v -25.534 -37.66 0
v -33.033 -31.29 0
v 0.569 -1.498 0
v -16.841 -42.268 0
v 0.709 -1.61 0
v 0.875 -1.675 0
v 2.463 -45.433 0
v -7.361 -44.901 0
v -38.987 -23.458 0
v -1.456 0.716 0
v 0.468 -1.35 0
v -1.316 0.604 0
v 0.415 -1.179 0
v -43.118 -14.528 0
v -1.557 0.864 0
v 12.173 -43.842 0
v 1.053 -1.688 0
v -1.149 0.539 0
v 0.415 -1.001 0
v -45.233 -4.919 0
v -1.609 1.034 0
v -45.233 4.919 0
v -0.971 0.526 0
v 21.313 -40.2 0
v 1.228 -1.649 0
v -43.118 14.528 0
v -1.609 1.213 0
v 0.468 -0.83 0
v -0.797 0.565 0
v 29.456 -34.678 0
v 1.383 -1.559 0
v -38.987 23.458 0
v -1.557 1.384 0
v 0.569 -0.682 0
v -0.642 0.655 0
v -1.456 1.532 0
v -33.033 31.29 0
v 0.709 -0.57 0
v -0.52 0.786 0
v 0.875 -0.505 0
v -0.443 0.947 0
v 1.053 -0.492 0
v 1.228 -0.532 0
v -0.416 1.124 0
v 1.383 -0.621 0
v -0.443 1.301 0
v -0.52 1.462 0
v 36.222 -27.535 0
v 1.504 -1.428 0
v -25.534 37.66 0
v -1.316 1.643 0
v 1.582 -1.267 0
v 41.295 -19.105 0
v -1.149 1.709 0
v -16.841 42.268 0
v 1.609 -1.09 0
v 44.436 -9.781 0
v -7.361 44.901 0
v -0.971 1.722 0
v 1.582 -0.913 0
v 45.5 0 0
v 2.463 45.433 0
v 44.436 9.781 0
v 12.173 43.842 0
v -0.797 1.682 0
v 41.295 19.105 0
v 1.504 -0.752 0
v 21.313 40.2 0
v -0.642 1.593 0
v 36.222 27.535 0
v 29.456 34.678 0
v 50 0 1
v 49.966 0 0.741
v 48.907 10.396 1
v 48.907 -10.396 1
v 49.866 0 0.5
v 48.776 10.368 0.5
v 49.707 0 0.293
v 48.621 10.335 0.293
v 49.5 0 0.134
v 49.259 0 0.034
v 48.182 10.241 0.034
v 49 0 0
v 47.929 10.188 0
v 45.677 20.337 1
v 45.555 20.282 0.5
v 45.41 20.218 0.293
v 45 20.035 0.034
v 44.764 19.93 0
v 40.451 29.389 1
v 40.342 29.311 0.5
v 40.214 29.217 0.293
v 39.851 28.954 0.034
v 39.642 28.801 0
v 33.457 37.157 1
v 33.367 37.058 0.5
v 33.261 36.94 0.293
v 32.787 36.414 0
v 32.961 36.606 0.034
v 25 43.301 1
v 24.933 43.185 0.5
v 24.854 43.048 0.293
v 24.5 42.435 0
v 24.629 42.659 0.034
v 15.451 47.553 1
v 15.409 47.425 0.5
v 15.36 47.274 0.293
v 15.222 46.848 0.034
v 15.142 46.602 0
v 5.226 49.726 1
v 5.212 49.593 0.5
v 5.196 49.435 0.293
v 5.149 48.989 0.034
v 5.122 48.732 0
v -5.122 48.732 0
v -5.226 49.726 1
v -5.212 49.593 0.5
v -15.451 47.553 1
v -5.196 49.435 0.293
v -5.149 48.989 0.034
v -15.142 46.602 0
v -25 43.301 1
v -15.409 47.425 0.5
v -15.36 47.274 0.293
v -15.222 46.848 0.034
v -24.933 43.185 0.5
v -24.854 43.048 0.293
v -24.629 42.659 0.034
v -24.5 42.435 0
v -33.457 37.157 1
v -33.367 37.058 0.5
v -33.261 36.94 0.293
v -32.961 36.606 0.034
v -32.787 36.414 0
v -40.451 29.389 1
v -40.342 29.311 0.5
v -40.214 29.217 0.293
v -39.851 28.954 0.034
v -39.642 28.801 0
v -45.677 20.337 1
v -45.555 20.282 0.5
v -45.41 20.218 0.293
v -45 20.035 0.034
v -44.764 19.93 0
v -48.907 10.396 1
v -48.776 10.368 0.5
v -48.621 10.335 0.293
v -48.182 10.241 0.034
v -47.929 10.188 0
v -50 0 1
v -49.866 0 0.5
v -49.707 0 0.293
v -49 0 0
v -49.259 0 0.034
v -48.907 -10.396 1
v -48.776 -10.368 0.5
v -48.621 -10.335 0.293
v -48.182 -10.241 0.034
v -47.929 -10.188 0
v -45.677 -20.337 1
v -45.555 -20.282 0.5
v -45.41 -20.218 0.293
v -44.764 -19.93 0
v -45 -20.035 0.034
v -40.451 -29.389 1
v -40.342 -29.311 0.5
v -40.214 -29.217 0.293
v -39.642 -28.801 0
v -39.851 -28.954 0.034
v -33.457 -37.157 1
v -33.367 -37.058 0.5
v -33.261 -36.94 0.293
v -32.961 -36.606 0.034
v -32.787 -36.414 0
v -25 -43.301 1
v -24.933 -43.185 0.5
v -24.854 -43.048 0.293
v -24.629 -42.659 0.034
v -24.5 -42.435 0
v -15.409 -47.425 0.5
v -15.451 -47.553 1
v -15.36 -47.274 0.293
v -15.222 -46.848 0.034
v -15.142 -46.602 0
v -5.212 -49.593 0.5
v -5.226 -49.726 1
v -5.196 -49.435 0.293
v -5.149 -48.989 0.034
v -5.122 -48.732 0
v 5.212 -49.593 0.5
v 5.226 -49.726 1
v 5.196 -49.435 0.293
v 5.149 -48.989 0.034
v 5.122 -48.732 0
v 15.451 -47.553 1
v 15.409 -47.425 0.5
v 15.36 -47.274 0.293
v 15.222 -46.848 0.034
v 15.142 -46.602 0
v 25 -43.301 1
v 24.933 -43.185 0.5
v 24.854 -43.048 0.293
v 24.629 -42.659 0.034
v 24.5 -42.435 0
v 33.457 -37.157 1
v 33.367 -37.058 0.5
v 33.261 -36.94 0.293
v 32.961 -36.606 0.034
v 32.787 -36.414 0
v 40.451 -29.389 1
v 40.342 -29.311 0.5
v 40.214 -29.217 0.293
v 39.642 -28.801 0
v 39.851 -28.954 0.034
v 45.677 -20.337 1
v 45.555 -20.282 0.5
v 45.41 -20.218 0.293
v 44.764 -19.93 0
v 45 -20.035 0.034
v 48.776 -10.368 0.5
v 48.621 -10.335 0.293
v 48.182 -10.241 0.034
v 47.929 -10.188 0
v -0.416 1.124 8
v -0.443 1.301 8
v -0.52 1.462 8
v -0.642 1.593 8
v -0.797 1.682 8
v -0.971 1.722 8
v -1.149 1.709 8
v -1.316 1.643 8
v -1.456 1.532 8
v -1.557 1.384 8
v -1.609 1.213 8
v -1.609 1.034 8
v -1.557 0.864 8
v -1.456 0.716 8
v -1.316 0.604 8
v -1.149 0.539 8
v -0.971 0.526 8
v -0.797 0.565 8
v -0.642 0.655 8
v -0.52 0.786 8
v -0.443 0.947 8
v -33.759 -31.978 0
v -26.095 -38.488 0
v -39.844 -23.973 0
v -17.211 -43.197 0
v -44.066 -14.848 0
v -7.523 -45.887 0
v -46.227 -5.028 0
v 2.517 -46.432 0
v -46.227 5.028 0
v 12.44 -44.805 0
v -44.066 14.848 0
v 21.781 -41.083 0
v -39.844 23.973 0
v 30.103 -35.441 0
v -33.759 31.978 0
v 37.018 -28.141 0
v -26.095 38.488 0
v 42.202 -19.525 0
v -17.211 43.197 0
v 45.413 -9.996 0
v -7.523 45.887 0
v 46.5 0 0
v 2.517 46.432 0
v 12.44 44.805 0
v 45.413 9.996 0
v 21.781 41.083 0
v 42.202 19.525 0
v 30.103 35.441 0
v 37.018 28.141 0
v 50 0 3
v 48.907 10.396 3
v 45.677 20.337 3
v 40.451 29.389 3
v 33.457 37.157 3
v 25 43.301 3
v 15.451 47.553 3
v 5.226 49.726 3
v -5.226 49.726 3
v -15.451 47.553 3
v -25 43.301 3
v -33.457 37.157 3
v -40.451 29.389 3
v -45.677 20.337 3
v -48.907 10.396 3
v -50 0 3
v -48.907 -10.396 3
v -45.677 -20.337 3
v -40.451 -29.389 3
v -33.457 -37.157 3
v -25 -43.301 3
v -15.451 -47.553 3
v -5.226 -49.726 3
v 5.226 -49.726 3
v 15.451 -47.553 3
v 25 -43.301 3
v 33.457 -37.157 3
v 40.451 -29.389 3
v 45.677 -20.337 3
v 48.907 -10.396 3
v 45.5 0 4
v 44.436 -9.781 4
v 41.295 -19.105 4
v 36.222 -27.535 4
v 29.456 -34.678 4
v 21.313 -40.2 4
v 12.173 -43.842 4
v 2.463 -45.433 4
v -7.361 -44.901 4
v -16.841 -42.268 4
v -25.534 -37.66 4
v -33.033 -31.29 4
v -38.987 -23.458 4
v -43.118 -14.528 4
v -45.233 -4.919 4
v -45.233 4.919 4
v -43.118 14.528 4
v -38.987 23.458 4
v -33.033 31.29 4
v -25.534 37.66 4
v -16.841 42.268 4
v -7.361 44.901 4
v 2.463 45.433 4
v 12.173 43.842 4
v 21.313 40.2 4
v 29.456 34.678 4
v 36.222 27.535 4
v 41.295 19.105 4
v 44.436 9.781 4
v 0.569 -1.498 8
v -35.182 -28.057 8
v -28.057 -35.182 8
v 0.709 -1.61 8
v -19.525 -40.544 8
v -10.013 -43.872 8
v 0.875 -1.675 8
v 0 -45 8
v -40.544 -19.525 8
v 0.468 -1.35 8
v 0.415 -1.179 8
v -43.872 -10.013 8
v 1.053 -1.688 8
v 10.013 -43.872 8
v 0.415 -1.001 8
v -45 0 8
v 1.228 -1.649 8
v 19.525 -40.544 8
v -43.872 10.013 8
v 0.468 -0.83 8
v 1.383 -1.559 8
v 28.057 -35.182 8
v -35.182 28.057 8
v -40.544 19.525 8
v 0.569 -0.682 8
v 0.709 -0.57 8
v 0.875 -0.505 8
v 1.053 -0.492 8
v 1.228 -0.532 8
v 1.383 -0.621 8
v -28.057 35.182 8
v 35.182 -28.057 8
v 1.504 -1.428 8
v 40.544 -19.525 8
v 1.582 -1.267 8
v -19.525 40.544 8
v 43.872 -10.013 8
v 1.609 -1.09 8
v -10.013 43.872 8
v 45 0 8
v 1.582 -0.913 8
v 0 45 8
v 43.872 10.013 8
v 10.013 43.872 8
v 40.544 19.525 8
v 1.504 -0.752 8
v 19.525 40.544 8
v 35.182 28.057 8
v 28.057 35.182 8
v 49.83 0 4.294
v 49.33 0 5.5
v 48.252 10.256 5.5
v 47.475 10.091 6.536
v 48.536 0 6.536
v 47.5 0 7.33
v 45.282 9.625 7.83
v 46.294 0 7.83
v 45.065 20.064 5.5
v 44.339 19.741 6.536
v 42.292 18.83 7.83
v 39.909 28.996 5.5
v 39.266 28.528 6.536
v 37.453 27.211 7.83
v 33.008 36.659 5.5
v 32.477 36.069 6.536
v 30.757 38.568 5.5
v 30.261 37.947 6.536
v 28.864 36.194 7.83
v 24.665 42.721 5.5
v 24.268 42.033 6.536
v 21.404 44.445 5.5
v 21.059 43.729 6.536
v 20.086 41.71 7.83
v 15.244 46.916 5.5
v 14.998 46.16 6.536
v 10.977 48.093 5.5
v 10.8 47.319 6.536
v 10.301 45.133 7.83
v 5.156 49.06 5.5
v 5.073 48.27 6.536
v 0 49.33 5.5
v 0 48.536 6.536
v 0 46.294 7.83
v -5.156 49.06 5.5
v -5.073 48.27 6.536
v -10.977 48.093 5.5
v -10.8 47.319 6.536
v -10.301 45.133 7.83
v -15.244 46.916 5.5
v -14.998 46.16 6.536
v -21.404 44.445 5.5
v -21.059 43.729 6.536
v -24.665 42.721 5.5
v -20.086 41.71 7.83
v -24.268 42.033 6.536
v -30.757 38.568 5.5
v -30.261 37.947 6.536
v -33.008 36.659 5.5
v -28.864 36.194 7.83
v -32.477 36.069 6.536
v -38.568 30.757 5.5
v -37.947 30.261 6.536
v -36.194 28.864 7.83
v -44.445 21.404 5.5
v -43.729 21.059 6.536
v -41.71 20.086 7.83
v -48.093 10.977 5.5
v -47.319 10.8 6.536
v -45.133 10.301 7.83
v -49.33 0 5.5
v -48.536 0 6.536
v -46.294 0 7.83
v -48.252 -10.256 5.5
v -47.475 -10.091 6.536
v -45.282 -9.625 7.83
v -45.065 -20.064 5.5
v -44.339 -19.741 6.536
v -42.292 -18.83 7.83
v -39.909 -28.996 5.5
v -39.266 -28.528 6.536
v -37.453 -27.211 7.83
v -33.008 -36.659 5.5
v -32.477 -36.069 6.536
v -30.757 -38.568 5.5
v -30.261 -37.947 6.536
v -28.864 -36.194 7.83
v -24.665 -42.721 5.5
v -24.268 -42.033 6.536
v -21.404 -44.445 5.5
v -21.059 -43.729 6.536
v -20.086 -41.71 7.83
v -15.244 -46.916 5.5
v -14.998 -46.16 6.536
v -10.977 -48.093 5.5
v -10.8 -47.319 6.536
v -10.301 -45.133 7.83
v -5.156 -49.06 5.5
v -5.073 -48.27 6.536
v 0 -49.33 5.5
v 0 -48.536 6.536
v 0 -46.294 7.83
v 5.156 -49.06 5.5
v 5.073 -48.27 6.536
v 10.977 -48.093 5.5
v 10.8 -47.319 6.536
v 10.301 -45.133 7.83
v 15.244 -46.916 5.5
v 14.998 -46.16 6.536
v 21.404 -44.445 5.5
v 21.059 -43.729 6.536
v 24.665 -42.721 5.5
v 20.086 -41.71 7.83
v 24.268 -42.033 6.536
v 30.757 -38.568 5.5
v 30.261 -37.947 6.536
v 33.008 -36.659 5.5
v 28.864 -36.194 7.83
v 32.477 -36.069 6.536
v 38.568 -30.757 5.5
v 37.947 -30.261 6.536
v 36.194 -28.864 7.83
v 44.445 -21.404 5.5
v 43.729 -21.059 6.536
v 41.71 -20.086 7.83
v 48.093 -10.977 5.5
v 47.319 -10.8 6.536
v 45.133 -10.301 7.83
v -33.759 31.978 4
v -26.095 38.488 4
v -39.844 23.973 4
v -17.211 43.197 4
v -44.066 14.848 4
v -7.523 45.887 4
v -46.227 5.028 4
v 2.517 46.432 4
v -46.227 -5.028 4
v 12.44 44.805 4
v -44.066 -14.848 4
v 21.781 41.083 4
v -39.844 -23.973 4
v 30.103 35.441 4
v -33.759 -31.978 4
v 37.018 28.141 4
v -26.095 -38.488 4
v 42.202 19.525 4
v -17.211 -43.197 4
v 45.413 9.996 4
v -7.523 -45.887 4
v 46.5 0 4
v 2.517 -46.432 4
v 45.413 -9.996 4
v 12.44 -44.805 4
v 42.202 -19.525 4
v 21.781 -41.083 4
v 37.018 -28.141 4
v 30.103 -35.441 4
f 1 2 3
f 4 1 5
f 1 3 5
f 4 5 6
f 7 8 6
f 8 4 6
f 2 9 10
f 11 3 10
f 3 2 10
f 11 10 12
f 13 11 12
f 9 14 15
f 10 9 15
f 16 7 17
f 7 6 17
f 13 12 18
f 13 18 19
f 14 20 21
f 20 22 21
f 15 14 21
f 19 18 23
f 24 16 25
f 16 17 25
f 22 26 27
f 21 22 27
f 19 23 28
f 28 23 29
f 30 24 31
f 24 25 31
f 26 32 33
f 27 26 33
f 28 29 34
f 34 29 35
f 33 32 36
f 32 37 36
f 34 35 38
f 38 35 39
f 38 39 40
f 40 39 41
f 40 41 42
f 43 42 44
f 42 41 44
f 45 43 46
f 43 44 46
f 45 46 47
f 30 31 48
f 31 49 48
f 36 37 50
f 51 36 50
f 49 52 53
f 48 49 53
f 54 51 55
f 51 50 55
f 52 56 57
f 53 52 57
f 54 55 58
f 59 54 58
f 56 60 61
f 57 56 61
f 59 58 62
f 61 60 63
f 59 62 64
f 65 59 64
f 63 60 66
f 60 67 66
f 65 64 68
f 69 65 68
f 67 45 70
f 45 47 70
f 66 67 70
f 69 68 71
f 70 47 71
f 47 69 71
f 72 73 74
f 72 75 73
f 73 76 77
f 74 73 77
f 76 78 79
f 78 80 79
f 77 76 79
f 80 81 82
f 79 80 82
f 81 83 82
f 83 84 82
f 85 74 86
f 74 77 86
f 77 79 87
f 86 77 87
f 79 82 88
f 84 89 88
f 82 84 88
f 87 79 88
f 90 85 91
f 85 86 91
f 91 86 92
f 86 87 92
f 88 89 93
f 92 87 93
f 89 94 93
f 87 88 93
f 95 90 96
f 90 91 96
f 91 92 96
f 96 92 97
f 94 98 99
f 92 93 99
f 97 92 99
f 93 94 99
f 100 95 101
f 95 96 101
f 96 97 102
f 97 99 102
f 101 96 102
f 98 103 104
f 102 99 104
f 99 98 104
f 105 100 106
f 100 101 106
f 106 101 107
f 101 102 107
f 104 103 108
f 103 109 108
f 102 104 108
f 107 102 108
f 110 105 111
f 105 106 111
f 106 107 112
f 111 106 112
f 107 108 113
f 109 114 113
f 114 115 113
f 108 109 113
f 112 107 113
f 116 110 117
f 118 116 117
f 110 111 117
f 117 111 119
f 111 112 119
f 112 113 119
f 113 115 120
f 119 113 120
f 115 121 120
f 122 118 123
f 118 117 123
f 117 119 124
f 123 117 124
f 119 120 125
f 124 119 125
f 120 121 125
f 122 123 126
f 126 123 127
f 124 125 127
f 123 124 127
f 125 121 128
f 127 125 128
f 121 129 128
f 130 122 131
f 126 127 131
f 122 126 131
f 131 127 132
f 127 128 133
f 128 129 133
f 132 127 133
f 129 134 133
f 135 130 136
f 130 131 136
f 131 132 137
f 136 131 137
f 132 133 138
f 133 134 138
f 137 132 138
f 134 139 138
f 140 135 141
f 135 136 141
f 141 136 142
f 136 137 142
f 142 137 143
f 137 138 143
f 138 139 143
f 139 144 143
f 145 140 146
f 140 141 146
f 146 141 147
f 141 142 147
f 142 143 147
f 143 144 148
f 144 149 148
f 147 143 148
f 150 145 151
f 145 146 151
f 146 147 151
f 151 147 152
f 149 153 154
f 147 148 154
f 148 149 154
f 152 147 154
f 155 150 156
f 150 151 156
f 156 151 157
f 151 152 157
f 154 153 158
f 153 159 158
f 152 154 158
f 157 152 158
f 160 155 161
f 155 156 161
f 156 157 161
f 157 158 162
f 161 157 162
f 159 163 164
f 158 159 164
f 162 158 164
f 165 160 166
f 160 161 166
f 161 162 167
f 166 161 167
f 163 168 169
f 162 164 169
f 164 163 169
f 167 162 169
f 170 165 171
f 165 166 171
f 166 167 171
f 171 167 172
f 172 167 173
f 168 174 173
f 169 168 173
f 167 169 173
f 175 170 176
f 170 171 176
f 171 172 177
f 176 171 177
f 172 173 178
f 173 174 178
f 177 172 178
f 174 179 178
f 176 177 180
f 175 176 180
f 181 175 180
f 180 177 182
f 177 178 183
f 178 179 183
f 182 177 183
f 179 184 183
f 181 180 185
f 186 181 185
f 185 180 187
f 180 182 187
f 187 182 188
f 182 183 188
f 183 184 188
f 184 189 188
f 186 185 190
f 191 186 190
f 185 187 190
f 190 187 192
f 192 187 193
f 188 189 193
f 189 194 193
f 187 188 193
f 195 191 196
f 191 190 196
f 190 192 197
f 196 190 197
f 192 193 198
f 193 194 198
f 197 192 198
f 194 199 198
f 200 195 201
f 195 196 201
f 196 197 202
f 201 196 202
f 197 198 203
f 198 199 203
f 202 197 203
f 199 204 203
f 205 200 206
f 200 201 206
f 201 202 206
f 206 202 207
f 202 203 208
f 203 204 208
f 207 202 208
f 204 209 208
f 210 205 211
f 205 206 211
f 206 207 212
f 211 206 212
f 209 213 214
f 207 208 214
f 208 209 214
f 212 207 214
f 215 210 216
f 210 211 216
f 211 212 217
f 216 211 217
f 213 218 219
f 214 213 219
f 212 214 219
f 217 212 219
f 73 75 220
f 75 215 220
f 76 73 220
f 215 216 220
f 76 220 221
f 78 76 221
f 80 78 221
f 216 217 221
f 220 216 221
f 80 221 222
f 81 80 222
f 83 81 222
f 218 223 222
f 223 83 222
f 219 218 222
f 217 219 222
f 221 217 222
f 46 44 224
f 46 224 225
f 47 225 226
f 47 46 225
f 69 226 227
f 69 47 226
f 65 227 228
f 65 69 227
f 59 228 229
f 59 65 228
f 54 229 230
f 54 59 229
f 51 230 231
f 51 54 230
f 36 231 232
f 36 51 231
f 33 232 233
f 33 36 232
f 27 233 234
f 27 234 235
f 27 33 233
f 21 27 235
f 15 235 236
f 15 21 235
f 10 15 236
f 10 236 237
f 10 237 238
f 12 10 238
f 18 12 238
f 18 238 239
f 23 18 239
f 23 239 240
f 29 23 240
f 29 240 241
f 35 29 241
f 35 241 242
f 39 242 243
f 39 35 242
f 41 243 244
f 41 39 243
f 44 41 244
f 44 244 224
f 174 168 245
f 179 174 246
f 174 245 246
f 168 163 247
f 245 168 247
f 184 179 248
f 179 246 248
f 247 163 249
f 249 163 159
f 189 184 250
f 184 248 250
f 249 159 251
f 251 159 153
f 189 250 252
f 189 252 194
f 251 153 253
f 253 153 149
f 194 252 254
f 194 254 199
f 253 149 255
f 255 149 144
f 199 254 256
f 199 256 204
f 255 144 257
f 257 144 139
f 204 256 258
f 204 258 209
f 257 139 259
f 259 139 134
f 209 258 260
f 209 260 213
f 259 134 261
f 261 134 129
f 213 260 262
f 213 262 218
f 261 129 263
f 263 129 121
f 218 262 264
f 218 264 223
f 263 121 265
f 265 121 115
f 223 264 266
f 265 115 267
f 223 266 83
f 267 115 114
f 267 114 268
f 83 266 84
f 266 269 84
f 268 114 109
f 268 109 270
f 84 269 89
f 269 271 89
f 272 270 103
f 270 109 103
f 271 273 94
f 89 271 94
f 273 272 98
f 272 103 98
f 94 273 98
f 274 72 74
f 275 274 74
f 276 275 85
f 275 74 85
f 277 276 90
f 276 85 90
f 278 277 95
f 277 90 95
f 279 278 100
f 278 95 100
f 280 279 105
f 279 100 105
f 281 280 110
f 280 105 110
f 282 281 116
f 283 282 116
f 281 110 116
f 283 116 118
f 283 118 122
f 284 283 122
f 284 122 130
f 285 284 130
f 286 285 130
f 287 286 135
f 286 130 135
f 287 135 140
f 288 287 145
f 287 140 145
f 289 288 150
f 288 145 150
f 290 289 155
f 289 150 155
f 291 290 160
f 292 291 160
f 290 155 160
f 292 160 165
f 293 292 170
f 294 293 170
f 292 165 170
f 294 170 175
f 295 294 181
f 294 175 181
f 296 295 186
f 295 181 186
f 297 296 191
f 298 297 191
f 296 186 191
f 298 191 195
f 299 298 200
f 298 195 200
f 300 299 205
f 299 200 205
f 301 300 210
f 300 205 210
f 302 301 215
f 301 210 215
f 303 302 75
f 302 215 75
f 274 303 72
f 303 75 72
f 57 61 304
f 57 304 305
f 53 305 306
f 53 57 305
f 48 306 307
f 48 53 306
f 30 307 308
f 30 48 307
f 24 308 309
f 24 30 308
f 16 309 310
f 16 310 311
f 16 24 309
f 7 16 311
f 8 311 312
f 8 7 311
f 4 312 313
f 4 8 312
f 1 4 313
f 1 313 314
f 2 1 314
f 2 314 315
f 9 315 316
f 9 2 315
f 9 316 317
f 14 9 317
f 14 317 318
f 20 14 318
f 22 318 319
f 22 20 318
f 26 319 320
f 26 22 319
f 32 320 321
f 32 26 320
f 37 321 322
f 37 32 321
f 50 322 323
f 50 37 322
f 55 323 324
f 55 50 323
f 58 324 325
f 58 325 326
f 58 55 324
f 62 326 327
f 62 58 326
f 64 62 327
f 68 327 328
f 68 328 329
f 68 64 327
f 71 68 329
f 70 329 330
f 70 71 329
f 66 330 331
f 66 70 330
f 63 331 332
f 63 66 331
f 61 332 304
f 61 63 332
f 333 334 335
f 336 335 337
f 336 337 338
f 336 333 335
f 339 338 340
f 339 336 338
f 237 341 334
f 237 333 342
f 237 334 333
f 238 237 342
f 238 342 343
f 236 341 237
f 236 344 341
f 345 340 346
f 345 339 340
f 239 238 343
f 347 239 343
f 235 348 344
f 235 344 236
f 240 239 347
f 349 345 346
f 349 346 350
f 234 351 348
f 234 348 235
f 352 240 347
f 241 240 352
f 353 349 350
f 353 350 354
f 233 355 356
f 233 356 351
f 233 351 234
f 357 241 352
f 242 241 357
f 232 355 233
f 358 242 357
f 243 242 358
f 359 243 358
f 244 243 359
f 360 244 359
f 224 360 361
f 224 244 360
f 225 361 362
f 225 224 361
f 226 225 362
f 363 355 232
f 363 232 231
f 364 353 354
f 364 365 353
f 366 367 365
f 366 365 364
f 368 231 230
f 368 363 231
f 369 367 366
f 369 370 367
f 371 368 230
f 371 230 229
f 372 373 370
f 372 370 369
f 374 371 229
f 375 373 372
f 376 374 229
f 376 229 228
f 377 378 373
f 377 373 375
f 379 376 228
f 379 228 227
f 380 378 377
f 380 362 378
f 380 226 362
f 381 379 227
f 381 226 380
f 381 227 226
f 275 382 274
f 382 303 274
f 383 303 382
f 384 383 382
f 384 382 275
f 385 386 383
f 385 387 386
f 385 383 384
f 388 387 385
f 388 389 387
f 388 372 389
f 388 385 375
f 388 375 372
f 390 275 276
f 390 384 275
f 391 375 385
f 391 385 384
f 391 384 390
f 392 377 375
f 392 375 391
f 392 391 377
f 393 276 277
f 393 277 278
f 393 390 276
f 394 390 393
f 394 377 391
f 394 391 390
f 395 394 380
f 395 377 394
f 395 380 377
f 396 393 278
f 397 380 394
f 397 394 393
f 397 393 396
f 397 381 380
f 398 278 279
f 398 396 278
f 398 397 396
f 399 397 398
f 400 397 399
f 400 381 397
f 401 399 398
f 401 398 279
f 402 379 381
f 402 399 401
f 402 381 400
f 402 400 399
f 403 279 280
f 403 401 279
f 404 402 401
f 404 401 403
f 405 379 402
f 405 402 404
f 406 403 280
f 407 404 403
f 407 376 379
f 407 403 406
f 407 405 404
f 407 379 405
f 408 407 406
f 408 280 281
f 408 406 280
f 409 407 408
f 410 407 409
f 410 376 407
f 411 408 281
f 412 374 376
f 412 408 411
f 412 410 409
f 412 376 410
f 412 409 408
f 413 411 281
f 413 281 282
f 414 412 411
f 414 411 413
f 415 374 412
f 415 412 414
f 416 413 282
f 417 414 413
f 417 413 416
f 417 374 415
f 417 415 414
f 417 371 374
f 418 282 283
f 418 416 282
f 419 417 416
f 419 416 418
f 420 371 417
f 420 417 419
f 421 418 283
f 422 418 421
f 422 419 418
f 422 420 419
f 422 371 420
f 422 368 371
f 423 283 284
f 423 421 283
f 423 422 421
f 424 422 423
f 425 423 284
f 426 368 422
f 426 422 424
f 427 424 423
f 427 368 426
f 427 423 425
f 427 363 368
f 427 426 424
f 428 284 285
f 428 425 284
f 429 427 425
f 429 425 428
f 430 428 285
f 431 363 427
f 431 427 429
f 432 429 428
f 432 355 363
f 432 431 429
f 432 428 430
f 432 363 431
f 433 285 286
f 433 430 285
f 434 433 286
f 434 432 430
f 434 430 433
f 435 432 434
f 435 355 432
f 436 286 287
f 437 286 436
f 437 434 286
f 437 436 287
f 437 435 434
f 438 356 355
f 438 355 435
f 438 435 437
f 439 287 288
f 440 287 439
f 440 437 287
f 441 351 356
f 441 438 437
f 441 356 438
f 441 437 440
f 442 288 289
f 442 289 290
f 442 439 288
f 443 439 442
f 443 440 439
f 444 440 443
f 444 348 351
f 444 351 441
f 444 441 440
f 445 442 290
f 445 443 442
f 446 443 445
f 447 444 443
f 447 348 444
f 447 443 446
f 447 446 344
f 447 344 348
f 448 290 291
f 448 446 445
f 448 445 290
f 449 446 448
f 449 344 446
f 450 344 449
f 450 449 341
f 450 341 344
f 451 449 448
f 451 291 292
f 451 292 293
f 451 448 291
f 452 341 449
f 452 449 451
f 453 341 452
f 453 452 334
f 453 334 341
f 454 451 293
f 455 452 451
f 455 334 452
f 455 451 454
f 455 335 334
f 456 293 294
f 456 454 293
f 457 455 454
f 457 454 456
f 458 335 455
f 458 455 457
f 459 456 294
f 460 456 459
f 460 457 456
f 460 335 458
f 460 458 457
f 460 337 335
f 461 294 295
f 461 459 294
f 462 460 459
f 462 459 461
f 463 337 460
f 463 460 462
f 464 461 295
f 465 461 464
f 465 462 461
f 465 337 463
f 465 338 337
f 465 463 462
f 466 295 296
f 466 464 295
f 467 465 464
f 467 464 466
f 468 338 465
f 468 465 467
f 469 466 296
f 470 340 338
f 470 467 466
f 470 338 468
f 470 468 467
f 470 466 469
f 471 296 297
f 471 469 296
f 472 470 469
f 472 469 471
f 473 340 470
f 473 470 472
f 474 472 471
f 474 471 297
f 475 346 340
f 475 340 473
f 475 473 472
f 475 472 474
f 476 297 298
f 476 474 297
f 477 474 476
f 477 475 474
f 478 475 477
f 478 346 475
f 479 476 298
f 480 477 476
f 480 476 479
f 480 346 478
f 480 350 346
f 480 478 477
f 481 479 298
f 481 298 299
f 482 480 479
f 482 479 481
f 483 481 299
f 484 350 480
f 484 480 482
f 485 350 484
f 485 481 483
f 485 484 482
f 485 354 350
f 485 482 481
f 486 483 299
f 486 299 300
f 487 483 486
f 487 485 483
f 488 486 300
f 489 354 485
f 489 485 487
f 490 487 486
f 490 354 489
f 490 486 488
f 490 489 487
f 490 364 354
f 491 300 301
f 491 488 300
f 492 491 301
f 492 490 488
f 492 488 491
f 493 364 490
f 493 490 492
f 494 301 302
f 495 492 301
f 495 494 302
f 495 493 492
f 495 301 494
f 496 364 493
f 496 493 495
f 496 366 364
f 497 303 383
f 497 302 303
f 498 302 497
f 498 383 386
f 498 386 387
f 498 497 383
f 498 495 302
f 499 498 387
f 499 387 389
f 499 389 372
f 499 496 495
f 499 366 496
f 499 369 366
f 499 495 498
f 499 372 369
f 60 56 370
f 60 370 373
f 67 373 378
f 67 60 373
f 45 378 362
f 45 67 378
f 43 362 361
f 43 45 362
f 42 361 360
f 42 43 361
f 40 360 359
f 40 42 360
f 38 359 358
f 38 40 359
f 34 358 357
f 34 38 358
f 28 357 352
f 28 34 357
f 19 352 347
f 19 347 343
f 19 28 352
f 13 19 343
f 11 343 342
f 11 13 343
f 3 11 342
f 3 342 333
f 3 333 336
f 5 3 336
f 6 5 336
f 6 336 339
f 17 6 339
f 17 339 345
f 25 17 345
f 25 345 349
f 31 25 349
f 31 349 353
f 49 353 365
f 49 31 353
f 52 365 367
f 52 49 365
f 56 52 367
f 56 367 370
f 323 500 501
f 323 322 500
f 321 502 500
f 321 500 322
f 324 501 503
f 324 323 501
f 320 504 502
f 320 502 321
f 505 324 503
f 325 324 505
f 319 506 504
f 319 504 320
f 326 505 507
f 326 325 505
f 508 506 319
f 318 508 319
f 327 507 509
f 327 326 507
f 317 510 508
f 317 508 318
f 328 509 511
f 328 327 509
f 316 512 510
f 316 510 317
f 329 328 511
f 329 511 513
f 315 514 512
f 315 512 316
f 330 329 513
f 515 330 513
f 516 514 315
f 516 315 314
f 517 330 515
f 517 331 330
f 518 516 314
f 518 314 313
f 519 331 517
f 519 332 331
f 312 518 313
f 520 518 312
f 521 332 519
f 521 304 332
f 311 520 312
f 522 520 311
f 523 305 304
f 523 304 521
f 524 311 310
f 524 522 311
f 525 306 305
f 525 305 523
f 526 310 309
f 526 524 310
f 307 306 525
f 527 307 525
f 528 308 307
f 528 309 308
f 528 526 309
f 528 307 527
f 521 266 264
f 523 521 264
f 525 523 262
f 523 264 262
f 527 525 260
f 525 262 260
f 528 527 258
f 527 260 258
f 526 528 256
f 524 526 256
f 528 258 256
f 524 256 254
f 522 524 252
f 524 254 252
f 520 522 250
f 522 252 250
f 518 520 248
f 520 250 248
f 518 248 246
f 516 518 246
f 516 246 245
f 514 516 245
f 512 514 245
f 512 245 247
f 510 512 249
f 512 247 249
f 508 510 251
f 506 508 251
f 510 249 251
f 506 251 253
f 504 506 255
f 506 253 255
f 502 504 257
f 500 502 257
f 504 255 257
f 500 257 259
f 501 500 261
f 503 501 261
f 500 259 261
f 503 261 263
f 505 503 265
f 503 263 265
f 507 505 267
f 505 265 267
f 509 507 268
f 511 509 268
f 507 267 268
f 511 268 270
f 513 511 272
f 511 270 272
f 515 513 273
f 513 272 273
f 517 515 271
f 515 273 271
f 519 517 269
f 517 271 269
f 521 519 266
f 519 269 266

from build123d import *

# Parameters (mm, degrees)
F0_R     = 50
F0_R_2   = 0.6
F1_DEPTH = 8
F2_R     = 5
F3_R     = 1
F4_R     = 46.5
F4_R_2   = 45.5
F5_DEPTH = 4


with BuildPart() as f1:
    # F0 (on Top) → F1 (new body)
    with BuildSketch(Plane.XY):
        Circle(F0_R)
        with Locations((1.008559, -1.090059)):
            Circle(F0_R_2, mode=Mode.SUBTRACT)
        with Locations((-1.015935, 1.123858)):
            Circle(F0_R_2, mode=Mode.SUBTRACT)
    extrude(amount=F1_DEPTH)

    # F2
    f2_edges = [f1.edges().sort_by_distance(p)[0] for p in [
        (-50, 0, 8),
    ]]
    fillet(f2_edges, radius=F2_R)

    # F3
    f3_edges = [f1.edges().sort_by_distance(p)[0] for p in [
        (-50, 0, 0),
    ]]
    fillet(f3_edges, radius=F3_R)

    # F4 (on face) → F5 (cut)
    with BuildSketch(Plane(origin=(0, 0, 0), x_dir=(1, 0, 0), z_dir=(0, 0, -1))):
        Circle(F4_R)
        Circle(F4_R_2, mode=Mode.SUBTRACT)
    extrude(amount=-F5_DEPTH, mode=Mode.SUBTRACT)


solid = f1.part
